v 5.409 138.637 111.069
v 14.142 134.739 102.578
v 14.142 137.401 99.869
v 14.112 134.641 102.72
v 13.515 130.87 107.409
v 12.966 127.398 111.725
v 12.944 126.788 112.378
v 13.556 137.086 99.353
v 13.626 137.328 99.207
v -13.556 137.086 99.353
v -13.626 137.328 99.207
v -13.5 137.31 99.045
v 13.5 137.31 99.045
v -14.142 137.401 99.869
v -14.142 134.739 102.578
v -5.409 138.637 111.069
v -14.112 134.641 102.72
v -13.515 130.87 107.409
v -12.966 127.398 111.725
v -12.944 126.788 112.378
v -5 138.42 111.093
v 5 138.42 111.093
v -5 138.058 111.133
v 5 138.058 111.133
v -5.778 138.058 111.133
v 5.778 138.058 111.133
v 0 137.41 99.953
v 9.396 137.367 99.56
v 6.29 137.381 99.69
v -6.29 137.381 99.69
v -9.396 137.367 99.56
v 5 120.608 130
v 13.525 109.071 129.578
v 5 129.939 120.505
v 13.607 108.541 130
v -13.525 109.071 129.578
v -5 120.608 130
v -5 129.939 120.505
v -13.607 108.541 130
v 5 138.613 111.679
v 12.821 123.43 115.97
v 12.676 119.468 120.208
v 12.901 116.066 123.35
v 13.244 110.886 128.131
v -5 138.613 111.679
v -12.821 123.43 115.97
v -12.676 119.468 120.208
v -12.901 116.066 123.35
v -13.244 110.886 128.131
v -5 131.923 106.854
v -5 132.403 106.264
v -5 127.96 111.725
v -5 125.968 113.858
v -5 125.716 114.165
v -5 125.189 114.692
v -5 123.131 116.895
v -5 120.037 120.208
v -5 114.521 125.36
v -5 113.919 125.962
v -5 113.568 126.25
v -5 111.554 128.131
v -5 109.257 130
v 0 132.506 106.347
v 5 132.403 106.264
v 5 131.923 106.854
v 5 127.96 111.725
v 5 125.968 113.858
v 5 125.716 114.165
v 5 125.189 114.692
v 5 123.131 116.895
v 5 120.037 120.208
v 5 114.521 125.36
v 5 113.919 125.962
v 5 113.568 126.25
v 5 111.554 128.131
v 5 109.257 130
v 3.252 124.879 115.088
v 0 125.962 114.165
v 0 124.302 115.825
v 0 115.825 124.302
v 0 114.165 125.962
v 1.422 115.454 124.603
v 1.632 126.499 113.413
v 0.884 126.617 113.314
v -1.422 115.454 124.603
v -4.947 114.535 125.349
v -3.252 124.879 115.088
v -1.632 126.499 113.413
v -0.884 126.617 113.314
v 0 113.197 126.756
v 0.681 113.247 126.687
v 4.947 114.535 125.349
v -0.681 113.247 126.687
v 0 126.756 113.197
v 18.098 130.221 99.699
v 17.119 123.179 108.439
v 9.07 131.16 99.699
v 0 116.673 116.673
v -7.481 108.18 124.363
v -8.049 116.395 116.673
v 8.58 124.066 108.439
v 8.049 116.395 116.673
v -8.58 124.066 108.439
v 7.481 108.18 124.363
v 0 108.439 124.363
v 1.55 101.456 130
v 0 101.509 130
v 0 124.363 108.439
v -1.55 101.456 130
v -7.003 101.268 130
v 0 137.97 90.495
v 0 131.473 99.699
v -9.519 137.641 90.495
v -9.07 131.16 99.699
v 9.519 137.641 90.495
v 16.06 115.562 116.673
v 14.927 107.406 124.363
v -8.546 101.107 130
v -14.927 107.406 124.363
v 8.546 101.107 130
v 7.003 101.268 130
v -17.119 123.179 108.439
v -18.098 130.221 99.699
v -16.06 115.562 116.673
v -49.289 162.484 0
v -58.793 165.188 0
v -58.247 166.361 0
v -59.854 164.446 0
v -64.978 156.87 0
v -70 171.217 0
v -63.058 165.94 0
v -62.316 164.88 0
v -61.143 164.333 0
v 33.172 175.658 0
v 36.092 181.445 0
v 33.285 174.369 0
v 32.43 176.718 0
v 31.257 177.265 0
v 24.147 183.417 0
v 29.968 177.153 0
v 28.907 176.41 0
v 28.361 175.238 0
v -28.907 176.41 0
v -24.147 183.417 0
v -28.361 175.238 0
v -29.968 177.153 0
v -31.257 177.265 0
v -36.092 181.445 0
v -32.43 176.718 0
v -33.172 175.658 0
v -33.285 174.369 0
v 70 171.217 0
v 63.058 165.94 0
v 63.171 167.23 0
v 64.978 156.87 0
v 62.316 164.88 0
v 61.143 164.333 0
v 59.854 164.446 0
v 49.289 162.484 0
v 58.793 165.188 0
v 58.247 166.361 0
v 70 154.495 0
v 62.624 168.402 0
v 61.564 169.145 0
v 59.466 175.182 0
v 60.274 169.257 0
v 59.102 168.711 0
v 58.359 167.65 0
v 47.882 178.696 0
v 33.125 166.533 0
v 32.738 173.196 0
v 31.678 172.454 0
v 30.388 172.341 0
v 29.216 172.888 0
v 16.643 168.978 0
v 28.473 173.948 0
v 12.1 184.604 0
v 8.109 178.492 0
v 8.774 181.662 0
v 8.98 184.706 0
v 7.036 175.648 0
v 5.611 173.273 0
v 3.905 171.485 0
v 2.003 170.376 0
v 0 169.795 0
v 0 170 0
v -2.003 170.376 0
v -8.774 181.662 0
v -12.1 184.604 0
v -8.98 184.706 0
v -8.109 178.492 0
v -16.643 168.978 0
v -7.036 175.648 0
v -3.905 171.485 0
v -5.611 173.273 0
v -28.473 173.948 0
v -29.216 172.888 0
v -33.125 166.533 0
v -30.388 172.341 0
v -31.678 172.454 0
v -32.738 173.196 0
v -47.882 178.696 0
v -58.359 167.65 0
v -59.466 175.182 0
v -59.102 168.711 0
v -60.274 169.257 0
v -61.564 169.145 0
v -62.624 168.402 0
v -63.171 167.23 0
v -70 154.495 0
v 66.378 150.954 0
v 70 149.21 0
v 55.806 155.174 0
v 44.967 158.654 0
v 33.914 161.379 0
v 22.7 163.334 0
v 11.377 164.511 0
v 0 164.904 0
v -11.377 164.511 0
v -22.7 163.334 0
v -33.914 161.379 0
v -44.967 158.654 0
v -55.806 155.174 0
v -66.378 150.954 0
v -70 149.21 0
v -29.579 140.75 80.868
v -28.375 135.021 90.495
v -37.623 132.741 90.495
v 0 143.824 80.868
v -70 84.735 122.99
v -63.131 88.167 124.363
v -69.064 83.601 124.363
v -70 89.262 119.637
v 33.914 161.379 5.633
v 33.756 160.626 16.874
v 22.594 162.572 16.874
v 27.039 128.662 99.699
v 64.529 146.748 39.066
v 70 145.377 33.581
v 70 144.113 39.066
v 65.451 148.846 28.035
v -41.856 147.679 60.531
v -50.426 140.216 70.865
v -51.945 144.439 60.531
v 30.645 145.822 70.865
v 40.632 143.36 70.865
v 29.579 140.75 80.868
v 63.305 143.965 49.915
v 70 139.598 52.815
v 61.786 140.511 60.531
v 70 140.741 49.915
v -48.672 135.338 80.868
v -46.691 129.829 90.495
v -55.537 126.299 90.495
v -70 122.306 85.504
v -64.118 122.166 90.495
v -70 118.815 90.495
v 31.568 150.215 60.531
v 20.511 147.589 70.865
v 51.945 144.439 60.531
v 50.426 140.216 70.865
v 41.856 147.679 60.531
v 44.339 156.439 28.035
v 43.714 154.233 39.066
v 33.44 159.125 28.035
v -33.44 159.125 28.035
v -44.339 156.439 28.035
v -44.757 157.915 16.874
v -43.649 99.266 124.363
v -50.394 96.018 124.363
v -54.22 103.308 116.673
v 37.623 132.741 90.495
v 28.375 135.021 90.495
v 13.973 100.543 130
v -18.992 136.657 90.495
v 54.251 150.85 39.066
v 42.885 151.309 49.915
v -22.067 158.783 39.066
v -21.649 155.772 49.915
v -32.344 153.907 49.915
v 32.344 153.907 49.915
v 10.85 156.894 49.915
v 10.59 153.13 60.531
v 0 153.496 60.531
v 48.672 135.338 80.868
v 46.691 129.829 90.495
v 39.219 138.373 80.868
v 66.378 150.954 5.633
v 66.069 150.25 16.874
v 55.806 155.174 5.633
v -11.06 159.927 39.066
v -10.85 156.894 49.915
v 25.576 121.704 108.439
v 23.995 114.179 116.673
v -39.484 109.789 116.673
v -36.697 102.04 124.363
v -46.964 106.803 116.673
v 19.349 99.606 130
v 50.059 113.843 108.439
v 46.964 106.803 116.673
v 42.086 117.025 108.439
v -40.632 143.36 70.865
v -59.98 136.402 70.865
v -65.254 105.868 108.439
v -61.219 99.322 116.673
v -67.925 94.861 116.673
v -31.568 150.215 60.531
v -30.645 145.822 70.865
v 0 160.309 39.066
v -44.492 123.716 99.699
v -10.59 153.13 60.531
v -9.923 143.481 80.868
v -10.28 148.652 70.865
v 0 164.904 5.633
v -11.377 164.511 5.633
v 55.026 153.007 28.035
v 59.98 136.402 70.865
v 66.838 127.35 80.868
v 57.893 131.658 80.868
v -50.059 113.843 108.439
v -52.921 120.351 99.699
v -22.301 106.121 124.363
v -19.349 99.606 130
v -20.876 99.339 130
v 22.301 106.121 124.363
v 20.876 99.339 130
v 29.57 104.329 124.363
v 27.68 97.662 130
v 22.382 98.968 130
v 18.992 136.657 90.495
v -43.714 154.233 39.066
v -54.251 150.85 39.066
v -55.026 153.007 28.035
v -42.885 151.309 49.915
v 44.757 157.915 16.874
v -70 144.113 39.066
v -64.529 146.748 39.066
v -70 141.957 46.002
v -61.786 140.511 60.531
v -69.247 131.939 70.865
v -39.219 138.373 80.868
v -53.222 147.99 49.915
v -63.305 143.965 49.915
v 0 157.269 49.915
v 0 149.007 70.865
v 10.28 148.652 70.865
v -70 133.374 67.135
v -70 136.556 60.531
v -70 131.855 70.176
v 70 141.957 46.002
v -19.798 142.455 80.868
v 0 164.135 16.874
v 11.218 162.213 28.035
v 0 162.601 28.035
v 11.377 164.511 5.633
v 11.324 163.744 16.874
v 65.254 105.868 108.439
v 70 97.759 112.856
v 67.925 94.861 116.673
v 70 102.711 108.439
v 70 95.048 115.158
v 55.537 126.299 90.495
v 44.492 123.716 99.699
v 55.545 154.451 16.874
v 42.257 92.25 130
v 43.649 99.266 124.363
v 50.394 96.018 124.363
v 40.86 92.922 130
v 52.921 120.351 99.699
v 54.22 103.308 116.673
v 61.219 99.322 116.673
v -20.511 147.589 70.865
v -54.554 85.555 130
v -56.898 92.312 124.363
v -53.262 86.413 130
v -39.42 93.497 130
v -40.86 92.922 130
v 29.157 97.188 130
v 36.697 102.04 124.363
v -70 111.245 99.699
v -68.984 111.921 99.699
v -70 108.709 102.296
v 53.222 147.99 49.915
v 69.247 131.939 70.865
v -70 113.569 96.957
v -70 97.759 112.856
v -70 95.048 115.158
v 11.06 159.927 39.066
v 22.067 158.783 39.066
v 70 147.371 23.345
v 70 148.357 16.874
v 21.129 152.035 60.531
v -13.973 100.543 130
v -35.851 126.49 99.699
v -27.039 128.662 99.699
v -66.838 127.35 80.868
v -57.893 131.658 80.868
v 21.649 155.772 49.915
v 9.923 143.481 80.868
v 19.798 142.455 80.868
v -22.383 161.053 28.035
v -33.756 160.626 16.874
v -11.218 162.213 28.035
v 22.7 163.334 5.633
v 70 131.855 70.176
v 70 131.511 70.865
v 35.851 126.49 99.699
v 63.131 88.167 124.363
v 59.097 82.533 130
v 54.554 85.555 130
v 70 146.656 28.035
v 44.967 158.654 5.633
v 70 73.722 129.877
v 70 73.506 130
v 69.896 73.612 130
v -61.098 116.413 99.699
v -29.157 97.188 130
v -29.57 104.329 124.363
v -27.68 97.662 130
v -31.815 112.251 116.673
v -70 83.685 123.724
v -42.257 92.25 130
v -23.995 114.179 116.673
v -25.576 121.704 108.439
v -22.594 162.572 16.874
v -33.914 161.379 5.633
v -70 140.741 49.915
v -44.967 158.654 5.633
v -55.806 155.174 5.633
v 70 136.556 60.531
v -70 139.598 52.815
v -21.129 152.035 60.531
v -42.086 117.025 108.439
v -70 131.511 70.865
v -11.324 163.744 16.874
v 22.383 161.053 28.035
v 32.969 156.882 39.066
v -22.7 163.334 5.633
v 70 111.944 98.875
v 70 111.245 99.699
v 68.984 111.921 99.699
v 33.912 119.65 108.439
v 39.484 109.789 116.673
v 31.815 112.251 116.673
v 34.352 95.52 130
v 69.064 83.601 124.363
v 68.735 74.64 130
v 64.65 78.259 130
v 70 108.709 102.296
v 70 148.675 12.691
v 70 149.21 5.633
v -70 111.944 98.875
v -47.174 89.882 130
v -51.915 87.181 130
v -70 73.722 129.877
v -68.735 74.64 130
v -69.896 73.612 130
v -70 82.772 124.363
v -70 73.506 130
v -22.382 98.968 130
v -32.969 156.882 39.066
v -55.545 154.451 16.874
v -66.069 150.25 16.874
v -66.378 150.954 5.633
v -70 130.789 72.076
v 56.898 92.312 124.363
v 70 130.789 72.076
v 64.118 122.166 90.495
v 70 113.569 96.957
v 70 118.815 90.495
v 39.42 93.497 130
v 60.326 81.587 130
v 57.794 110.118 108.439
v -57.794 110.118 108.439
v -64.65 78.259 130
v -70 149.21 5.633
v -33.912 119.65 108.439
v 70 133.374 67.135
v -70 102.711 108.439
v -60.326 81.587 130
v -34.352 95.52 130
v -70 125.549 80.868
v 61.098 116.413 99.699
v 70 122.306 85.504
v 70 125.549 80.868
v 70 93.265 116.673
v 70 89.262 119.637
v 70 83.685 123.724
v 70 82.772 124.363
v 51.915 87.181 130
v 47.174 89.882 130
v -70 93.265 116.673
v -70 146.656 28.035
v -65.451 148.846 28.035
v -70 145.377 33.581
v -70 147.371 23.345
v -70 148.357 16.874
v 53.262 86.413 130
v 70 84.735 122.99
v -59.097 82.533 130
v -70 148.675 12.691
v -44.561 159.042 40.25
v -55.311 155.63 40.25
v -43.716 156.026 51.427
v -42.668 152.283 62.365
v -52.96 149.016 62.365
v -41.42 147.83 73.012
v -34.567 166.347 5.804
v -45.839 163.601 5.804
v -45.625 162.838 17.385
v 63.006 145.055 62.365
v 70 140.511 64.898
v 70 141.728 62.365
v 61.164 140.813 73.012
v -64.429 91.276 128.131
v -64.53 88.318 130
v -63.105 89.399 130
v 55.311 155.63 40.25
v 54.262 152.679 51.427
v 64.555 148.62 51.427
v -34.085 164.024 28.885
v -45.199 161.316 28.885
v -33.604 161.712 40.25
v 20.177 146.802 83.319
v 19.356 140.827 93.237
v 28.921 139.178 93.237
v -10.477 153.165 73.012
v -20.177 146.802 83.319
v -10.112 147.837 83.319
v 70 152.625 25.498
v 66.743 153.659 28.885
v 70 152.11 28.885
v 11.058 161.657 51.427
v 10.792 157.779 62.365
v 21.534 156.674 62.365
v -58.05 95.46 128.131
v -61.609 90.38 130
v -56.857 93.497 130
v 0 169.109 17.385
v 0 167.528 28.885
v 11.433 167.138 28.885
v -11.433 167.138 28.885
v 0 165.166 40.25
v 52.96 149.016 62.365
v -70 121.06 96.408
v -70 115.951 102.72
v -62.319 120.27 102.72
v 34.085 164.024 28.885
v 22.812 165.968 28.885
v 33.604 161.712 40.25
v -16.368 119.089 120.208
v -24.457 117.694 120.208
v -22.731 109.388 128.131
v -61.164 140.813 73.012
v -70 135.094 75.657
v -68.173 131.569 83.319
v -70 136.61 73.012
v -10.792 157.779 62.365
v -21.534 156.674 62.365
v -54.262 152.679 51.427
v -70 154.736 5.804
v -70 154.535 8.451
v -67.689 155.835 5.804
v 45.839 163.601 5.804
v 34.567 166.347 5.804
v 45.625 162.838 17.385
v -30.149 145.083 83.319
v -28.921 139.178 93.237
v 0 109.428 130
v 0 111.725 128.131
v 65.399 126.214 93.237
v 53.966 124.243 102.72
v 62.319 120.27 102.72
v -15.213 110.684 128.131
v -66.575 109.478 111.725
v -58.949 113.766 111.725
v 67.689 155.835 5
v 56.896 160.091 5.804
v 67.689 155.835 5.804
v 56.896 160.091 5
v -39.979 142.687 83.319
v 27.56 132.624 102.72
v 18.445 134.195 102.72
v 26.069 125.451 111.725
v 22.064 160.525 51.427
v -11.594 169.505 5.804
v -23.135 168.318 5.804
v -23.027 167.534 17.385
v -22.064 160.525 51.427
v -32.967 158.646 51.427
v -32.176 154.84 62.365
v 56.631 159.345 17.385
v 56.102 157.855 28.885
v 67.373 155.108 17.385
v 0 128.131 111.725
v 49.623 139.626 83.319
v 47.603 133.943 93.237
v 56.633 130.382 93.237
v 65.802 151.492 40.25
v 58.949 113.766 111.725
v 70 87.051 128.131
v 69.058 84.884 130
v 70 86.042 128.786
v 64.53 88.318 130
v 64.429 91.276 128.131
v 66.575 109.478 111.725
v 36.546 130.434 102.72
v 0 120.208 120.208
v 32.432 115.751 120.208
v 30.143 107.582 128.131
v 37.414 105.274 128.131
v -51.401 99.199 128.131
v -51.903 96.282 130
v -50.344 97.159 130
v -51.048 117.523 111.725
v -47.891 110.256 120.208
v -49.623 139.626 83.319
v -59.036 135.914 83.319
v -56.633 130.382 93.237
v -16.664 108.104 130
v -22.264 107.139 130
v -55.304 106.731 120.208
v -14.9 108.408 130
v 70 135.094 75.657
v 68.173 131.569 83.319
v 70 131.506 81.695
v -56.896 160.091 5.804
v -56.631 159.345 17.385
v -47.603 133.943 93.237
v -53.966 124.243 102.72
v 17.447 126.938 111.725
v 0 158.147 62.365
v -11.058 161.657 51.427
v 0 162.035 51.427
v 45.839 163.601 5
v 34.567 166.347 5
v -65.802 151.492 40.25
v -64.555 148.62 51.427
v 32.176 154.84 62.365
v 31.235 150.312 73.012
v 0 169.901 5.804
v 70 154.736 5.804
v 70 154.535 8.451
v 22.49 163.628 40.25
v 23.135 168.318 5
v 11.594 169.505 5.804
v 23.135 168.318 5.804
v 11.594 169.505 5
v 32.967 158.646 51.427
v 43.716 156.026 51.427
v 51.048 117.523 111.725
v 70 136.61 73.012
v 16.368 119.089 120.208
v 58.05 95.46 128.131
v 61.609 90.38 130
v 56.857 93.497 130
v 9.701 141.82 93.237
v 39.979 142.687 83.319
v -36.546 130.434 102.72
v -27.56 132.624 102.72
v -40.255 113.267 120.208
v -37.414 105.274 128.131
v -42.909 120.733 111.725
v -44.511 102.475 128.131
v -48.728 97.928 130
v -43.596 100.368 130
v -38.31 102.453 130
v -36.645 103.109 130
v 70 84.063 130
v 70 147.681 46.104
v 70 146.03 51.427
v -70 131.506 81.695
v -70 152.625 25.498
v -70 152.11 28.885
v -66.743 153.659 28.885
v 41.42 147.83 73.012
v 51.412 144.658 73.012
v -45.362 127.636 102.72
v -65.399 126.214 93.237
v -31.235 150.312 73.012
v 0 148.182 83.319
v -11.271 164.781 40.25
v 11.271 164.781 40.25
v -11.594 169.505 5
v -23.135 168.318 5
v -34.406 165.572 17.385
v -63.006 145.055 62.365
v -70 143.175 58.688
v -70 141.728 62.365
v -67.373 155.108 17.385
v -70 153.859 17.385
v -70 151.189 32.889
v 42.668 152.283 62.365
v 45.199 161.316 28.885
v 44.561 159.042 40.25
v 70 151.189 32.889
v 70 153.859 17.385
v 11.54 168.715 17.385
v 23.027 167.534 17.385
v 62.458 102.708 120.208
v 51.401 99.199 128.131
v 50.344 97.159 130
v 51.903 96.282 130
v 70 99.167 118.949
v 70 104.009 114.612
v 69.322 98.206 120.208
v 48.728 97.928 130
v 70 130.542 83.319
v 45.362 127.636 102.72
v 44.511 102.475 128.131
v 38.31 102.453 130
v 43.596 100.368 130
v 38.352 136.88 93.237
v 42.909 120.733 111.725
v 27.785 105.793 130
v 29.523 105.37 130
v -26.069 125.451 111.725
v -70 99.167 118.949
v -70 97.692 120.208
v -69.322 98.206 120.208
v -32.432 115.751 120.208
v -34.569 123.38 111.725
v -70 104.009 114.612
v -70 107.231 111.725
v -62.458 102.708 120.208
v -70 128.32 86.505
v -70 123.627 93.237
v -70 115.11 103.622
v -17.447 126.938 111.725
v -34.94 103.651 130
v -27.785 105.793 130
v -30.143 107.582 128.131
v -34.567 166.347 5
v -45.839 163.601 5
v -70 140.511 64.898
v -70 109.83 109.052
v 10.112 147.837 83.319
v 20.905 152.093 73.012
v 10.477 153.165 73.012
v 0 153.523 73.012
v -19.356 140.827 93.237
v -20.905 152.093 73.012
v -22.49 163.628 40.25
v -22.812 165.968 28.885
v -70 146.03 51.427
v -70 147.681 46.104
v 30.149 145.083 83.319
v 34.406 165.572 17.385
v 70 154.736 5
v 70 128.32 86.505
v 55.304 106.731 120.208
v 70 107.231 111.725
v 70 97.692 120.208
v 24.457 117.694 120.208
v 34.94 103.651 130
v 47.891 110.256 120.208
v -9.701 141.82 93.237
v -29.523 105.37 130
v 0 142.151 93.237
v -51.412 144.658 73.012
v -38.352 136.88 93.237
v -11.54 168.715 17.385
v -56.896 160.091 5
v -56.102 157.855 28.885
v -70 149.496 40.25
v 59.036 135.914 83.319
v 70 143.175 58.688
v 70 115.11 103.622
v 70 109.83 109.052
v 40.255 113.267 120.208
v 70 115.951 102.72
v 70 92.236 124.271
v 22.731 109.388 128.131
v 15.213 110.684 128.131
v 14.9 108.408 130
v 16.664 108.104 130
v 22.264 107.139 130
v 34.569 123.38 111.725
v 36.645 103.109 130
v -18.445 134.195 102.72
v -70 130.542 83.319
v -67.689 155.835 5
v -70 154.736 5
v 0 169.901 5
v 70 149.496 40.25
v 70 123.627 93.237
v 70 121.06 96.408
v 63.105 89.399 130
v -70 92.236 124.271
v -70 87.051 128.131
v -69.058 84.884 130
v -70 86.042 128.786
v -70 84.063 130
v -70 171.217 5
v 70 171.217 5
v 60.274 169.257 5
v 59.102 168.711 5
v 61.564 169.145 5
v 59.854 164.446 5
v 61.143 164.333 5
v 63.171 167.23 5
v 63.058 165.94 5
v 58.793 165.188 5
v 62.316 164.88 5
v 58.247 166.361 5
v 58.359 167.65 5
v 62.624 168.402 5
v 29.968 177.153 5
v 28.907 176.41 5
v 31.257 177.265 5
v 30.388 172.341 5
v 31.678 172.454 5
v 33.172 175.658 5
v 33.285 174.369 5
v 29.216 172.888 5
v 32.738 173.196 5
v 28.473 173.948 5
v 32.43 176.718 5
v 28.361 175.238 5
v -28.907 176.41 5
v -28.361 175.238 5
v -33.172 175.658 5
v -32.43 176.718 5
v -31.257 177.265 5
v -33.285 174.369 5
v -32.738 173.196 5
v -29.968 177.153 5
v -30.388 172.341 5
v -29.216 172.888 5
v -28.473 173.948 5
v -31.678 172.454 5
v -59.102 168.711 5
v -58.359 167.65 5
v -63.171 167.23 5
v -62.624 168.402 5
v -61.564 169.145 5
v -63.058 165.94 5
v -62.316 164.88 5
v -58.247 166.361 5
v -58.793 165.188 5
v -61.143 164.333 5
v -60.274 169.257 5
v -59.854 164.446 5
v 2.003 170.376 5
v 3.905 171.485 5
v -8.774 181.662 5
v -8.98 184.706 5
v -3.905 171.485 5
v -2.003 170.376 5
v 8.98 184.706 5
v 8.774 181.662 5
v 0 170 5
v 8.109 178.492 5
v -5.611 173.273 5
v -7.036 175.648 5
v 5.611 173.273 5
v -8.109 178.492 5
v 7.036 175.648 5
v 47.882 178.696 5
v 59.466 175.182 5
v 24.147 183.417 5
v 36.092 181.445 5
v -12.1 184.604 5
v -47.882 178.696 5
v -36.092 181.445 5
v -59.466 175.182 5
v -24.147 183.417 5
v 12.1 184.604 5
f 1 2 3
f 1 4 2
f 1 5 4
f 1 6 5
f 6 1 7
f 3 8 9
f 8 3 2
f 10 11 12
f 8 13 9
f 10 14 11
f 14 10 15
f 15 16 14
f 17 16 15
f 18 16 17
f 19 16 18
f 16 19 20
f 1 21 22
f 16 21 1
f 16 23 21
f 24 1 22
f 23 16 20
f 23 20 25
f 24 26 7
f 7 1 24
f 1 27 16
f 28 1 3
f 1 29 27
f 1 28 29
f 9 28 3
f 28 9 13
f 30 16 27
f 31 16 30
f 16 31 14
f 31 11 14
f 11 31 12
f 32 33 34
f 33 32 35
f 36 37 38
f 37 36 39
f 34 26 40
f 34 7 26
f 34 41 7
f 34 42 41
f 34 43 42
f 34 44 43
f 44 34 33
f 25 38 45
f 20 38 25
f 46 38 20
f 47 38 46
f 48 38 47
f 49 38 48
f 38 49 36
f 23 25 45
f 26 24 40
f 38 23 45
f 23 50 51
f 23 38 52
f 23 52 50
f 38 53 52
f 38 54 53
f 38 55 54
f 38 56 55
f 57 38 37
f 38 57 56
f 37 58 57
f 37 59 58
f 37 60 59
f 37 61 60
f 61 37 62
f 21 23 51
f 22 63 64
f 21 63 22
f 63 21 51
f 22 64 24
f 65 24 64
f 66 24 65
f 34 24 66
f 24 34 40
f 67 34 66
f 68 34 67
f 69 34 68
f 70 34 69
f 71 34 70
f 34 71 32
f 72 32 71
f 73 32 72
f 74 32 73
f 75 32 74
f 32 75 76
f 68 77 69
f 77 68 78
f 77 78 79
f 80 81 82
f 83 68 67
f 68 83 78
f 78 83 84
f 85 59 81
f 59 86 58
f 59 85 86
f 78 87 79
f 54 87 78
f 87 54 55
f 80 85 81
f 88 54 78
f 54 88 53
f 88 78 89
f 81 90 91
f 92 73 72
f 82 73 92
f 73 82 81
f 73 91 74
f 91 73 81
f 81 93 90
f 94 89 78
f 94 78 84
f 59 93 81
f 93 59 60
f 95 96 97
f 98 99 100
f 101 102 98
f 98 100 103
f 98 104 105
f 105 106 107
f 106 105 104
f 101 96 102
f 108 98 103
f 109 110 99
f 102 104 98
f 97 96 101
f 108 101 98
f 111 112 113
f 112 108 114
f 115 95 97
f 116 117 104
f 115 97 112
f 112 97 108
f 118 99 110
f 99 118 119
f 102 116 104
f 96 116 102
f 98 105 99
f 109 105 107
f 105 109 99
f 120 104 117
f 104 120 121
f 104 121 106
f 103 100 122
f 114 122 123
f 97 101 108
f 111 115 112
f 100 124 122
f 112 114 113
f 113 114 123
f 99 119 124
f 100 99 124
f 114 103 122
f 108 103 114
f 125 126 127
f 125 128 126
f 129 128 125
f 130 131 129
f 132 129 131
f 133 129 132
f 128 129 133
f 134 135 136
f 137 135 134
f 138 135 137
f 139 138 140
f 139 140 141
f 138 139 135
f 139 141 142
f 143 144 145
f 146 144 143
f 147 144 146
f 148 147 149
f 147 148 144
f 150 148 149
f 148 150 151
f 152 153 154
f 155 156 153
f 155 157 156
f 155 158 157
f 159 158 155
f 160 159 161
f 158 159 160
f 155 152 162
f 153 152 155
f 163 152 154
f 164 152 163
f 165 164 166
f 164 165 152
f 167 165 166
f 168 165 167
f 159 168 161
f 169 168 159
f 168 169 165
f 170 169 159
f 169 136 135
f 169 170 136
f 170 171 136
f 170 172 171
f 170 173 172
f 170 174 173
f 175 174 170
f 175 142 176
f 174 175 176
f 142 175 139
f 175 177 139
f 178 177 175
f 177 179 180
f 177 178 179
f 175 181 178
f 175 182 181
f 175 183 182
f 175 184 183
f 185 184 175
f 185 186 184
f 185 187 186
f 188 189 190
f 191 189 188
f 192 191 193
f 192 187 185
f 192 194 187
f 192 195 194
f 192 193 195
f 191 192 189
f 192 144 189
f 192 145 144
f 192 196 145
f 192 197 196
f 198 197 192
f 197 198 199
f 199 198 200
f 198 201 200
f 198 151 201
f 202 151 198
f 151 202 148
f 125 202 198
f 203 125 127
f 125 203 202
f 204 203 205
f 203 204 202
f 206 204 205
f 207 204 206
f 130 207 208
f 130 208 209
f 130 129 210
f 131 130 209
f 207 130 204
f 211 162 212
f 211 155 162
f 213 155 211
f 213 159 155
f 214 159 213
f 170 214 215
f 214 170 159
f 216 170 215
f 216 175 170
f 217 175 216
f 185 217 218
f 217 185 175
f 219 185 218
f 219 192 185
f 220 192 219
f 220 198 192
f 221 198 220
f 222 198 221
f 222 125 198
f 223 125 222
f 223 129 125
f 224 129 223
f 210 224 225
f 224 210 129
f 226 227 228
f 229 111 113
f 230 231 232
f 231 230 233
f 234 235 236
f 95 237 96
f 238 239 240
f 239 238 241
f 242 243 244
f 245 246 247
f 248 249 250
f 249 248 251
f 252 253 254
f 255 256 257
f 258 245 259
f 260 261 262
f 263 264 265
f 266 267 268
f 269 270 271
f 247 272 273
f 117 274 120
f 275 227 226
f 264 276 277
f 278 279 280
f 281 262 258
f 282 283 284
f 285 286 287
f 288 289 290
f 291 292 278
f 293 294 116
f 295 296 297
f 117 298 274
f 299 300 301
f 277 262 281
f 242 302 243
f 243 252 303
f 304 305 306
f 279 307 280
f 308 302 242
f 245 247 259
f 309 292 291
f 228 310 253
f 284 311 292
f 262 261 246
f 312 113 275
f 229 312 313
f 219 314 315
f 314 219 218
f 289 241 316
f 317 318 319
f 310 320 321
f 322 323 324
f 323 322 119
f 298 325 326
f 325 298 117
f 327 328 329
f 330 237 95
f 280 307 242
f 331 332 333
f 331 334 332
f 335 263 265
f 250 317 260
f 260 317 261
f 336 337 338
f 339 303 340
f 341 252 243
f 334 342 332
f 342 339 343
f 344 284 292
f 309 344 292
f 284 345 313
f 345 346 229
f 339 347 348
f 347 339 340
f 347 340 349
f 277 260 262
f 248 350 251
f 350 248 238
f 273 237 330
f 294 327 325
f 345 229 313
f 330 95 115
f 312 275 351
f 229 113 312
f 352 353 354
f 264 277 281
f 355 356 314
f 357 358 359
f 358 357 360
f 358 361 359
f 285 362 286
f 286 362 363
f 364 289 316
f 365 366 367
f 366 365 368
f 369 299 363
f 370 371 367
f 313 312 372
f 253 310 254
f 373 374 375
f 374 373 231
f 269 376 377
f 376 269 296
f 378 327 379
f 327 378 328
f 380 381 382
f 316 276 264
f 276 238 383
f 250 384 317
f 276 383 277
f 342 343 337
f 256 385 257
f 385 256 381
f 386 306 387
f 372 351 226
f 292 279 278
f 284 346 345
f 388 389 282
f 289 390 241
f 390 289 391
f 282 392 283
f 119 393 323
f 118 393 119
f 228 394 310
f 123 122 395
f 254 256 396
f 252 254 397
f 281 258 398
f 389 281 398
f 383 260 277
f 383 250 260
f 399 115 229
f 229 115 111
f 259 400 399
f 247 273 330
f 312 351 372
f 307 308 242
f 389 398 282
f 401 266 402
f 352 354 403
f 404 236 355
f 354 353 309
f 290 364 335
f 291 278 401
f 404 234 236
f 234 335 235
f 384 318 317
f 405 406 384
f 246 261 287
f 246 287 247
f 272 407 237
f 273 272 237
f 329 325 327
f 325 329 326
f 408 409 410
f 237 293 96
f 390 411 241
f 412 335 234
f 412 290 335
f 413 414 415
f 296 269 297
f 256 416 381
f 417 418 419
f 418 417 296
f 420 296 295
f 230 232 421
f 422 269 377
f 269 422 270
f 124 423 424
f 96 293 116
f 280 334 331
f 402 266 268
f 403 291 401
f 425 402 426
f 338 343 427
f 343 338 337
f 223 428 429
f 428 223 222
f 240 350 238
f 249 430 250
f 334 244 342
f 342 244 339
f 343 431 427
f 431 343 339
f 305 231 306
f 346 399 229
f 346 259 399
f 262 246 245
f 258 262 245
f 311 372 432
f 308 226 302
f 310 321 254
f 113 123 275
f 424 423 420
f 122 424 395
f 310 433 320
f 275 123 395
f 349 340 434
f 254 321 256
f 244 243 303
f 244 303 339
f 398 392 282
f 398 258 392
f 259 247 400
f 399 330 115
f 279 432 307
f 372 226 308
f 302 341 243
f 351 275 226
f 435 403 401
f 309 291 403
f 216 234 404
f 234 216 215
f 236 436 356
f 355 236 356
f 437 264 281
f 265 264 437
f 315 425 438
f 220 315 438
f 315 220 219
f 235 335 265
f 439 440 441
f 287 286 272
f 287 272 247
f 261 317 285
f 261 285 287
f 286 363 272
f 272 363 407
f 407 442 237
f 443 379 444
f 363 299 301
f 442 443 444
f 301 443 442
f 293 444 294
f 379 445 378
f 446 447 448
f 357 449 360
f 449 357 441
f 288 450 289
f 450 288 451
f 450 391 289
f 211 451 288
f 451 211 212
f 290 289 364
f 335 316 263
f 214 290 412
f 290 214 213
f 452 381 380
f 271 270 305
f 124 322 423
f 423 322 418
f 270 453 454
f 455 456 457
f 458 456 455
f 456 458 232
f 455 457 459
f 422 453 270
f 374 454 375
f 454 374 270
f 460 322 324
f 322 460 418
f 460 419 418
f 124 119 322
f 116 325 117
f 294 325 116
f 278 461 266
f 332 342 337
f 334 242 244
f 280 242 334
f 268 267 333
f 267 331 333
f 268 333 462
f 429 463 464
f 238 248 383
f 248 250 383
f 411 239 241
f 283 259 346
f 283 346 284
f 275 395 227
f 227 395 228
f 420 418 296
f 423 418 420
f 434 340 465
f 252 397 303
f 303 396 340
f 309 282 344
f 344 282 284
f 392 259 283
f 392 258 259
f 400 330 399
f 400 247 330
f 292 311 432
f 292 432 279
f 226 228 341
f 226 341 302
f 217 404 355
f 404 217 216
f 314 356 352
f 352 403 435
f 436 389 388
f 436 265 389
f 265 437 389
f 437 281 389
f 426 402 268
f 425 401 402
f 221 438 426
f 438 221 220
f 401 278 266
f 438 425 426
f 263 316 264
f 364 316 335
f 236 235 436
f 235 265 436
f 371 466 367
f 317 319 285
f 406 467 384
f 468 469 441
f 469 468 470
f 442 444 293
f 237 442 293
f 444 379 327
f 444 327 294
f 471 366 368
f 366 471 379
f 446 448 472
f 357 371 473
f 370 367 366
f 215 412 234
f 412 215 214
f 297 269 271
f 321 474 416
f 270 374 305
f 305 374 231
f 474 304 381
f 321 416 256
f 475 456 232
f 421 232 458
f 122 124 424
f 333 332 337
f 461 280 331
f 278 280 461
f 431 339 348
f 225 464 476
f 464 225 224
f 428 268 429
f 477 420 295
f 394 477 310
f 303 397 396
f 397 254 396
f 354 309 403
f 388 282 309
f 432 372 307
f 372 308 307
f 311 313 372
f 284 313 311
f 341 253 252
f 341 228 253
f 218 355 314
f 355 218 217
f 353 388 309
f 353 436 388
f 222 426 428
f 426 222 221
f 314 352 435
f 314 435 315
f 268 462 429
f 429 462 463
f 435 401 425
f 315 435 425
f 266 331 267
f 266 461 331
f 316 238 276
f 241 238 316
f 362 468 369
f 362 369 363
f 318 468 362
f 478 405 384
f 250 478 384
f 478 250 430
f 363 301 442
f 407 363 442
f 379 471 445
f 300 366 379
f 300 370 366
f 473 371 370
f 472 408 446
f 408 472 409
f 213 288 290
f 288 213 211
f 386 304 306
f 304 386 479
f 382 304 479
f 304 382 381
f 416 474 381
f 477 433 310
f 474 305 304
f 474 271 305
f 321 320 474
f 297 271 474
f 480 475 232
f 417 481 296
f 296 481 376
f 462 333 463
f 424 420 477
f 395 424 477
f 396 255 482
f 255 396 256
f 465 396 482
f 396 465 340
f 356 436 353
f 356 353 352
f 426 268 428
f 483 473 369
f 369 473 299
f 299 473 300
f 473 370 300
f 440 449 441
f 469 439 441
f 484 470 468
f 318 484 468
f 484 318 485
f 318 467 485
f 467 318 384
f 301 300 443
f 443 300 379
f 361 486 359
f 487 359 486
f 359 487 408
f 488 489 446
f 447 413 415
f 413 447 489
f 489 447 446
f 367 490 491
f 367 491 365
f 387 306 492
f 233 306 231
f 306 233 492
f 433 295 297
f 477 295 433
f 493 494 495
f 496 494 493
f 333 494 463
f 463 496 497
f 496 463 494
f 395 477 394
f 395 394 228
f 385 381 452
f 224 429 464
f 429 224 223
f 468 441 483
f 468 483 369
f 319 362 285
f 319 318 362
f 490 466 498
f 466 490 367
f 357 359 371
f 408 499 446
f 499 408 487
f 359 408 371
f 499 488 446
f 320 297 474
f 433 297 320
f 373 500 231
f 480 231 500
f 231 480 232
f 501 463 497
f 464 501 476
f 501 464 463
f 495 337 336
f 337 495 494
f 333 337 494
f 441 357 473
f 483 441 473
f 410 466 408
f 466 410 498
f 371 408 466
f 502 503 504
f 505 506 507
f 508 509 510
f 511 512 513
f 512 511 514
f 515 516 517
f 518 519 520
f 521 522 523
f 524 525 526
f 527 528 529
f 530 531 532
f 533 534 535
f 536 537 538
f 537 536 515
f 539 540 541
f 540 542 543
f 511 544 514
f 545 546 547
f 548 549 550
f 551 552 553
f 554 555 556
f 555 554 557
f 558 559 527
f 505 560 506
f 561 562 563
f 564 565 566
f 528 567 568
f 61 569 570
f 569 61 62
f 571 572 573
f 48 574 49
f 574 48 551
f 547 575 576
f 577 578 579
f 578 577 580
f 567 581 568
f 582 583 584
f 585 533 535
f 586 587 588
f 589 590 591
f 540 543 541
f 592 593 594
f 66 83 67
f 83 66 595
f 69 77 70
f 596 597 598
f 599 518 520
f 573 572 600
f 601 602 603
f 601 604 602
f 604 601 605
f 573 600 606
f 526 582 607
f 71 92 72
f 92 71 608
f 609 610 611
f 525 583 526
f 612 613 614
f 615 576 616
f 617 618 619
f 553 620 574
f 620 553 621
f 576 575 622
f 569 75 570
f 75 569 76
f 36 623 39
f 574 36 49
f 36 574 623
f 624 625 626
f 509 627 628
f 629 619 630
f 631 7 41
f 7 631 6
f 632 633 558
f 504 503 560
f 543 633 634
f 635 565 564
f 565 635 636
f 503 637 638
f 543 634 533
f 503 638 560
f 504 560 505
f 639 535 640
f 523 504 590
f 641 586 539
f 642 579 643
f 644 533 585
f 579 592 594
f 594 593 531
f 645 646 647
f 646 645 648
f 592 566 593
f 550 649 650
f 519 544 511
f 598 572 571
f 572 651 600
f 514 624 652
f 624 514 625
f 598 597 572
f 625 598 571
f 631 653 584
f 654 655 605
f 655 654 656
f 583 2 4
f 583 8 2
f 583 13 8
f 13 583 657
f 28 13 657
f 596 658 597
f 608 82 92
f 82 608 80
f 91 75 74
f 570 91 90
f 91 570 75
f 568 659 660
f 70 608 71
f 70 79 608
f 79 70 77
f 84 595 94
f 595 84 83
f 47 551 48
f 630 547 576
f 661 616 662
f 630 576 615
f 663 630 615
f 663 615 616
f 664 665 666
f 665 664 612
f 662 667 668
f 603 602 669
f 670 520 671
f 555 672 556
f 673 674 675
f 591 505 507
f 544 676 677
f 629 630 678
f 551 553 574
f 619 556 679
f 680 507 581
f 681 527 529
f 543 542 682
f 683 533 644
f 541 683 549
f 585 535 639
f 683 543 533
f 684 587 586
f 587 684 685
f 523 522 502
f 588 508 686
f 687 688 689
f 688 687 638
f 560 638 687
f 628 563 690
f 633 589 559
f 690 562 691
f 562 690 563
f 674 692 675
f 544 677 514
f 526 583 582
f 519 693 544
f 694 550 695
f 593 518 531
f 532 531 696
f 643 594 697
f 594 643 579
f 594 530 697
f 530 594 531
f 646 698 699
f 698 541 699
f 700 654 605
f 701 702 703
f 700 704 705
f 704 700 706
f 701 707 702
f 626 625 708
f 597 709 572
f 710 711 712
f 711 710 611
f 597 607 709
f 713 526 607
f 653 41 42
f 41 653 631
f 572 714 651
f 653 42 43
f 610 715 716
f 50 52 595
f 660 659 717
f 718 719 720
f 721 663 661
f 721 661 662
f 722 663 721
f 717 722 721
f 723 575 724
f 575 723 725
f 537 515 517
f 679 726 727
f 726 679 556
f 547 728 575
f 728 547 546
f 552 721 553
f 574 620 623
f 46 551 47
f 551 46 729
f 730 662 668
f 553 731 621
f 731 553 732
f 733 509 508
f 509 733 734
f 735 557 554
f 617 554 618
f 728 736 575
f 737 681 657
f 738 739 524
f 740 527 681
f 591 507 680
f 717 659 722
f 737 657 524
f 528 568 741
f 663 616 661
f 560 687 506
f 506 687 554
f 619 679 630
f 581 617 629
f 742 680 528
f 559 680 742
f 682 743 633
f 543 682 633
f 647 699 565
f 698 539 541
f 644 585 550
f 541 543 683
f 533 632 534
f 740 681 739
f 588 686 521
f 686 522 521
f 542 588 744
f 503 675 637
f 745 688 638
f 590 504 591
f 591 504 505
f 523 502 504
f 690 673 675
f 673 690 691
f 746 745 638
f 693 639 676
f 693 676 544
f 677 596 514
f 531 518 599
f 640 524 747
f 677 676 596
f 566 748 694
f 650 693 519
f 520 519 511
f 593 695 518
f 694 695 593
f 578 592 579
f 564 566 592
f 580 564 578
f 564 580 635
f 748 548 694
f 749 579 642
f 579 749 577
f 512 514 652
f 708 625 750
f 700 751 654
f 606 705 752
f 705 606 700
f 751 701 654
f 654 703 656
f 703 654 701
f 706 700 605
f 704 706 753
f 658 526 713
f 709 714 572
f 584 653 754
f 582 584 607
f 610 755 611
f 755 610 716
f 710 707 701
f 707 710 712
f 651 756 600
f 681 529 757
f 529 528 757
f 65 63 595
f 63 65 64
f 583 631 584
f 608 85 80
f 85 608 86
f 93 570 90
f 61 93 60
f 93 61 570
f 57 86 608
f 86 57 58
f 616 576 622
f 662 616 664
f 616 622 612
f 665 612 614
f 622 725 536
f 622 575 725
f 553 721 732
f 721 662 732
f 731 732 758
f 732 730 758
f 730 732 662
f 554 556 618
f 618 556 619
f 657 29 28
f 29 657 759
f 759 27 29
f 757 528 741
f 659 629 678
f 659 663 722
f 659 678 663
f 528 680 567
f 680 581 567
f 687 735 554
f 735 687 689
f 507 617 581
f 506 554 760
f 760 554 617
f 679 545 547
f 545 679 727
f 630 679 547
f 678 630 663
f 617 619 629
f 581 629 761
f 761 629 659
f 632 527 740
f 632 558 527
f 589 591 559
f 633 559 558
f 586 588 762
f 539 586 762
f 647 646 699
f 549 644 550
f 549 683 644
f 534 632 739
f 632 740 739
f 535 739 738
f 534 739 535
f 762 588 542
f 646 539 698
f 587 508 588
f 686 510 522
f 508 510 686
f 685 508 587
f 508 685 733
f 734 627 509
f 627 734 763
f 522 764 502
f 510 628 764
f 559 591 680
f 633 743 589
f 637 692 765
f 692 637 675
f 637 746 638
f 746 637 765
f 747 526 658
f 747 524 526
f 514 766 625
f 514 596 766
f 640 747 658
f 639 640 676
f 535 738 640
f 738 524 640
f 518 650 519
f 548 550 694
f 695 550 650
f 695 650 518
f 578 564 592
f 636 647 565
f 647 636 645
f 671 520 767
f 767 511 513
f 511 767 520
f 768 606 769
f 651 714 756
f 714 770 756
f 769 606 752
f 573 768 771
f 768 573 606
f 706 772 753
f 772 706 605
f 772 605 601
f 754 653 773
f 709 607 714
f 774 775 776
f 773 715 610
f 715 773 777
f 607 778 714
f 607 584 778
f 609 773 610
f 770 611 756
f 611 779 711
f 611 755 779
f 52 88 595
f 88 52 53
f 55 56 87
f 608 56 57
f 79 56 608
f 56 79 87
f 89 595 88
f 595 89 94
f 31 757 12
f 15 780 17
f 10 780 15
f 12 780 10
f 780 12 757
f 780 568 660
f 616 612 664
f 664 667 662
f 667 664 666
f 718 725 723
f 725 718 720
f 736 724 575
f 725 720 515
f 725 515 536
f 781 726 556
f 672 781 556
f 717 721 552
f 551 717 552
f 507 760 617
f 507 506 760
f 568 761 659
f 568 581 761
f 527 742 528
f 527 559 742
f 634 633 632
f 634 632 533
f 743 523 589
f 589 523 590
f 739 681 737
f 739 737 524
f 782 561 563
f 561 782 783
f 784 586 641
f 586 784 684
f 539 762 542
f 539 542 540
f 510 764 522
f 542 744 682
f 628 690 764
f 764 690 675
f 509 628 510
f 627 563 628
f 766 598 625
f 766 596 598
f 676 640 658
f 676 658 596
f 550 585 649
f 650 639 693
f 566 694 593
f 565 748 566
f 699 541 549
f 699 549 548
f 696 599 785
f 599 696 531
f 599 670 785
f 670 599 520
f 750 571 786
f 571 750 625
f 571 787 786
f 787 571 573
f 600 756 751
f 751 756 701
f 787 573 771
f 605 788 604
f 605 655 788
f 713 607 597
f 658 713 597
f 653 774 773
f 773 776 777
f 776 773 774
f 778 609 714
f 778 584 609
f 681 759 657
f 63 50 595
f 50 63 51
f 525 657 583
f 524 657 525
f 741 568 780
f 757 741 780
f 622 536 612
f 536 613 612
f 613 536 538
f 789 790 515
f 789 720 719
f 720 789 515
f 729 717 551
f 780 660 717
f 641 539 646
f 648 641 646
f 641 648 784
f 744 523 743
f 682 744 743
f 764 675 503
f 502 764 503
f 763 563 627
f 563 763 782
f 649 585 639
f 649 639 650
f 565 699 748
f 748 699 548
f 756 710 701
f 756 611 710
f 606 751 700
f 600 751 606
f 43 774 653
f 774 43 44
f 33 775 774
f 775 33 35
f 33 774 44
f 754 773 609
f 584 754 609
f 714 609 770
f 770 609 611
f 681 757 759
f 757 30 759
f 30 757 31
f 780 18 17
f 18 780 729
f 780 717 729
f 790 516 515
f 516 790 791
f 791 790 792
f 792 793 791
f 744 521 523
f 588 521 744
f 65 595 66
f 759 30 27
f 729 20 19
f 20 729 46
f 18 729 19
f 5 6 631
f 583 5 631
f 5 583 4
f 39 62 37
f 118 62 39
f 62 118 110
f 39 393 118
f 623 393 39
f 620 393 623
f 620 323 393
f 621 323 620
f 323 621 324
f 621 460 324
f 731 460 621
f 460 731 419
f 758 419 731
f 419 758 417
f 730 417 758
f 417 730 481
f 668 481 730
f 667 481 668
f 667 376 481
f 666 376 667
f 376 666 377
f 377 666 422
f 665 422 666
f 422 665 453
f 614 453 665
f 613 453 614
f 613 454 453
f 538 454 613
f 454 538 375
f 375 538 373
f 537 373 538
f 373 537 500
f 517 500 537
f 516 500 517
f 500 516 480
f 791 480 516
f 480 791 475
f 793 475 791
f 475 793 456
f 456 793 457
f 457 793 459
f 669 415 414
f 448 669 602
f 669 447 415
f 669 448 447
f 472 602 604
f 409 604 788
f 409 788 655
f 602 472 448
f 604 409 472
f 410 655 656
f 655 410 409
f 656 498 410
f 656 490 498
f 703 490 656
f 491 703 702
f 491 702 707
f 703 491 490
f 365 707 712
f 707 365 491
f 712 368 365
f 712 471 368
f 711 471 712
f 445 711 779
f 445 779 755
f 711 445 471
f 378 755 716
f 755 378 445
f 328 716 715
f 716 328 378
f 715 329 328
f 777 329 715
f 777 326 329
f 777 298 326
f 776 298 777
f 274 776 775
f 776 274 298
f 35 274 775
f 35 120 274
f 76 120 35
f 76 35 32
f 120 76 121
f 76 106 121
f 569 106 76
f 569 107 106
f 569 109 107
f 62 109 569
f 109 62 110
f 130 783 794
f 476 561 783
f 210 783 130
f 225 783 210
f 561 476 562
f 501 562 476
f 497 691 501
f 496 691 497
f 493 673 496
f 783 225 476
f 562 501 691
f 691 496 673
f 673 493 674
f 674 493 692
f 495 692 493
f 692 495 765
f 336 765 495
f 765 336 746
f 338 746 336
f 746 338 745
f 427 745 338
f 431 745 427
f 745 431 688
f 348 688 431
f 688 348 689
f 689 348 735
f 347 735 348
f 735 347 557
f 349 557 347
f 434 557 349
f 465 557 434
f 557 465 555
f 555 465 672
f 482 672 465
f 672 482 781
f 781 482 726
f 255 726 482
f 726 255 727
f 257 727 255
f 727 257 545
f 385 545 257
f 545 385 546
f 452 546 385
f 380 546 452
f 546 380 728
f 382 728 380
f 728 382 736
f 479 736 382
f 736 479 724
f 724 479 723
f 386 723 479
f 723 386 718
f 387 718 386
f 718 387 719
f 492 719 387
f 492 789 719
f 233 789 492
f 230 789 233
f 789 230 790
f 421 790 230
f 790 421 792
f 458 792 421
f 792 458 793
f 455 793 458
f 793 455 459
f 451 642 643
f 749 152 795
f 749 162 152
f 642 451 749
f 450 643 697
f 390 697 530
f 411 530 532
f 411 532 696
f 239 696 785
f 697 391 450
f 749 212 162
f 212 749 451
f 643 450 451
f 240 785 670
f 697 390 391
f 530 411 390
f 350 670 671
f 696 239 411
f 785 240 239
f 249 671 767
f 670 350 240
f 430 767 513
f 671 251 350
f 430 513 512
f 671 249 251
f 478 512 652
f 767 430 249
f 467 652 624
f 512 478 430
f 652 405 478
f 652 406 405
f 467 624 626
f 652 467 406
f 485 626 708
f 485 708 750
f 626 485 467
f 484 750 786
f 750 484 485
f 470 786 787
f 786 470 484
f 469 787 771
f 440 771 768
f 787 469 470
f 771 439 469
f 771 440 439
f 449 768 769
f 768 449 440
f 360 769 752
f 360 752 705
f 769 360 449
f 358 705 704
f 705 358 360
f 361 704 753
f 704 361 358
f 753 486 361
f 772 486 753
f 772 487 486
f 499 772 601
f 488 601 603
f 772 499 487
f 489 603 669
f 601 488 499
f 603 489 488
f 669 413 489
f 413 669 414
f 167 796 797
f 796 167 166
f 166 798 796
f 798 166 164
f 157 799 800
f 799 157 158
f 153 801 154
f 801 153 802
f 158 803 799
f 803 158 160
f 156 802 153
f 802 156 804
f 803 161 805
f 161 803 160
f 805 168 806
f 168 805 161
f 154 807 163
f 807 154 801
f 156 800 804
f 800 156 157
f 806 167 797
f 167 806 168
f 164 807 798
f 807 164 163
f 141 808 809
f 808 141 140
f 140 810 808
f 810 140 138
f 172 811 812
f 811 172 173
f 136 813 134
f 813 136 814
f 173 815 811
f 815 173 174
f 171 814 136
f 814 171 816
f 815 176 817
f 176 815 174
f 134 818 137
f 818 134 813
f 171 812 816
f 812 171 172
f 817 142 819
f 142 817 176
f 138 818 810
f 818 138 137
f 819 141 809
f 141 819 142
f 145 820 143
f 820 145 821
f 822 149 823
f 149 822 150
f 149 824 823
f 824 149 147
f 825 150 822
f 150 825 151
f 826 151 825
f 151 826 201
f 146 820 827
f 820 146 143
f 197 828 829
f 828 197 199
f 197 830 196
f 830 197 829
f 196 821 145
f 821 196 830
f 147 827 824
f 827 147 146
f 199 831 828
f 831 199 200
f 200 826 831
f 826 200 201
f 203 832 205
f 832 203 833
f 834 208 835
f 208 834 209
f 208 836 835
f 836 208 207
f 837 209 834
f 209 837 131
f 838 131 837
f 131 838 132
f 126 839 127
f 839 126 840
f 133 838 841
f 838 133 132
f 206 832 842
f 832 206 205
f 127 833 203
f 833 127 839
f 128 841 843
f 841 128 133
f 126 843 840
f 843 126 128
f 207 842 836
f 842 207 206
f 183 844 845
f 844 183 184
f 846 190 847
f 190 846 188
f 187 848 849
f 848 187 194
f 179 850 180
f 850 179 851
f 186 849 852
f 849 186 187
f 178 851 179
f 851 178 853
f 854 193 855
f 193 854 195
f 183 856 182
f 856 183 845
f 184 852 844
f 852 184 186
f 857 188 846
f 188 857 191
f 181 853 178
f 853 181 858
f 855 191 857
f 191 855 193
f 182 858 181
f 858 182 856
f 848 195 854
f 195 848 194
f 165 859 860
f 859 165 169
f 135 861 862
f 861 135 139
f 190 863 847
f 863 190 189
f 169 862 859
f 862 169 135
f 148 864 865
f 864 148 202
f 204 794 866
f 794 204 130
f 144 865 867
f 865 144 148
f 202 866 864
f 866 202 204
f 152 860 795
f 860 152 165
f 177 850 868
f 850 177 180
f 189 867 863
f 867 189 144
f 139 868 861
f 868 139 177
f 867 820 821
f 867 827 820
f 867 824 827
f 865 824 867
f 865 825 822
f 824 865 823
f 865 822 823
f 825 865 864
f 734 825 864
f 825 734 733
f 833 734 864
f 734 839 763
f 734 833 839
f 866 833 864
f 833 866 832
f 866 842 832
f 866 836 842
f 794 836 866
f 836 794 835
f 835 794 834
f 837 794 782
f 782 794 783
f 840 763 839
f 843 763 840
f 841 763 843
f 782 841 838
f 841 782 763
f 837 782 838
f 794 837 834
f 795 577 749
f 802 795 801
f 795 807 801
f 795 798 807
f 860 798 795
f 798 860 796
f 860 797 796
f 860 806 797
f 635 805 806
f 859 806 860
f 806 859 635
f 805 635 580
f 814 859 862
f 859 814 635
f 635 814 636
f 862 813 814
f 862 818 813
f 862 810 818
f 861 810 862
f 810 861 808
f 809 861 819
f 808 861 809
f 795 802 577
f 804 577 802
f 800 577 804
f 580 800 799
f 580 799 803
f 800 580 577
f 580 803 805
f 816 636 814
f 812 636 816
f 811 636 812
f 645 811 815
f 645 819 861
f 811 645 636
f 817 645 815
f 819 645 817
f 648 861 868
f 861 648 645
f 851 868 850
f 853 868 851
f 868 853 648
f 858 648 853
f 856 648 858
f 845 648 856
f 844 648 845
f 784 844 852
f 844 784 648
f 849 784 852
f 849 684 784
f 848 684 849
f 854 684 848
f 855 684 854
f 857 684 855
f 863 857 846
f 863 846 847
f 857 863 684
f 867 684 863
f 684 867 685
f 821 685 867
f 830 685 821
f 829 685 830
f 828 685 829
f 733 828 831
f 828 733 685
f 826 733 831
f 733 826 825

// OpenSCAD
// file: ../motors/MN5212.scad
use <../utils.scad>

module MN5212(){

	render(){
		translate([0,0, 42.5 / 2 - 23 / 2 - 4.9 - 6])
			cylinder(
				h = 23,
				r = 59 / 2,
				$fa = fa(59 / 2),
				center = true);
		translate([0,0, 42.5 / 2 - 4.9 / 2 - 6])
			cylinder(
				h = 4.9,
				r1 = 59 / 2,
				r2 = 24.8 / 2,
				$fa = fa(59 / 2),
				center = true);
		translate([0,0, - 42.5 / 2 + 5.6 / 2 + 3])
			cylinder(
				h = 5.6,
				r1 = 44 / 2,
				r2 = 59 / 2,
				$fa = fa(59 / 2),
				center = true);
		translate([0, 0, 42.5 / 2 - 3])
			cylinder(
				h = 6,
				r = 4 / 2,
				$fa = fa(4 / 2),
				center = true);
		translate([0, 0, - 42.5 / 2 + 1.5])
			cylinder(
				h = 3,
				r = 6 / 2,
				$fa = fa(6 / 2),
				center = true);
	}

}
// file: ../servos/HS_5065MG.scad
use <../utils.scad>

module HS_5065MG(){

	length = 23.75;
	width = 11.68;
	depth = 20.32;
	wing_width = 32.38;
	wing_thick = 3.43;
	shaft_offset = 6;
	hole_spacing = 28.32;
	shaft_height = 26.16;
	shaft_length = 2;

	module mounting_hole(){
		mh_rad = 2 / 2;
		translate(
			[
				hole_spacing / 2,
				0,
				depth / 2 - wing_thick / 2
			])
			cylinder(h = 5, r = mh_rad, $fa = fa(mh_rad), center = true);
	}

	difference(){
		union(){
			cube([length, width, depth], center = true);
			translate([0, 0, depth / 2 - wing_thick / 2])
				cube([wing_width, width, wing_thick], center = true);
			translate(
				[
					- length / 2 + shaft_offset,
					0,
					shaft_height - length / 2 + shaft_length / 2
				])
				cylinder(
					h = shaft_length,
					r = 1.5,
					$fa = fa(1.5),
					center = true);
		}	union(){

			mounting_hole();
			mirror() mounting_hole();
		}
	}
}

HS_5065MG();
// file: ../servos/LS_0006_servo.scad
// Author Michael Marques (DrYerzinia)

use <../utils.scad>

module ls_0006_servo(){
	
	length = 21.4;
	depth = 19.9;
	thickness = 11.65;

	gear_height = 2.6;
	gear_bump_height = 0.7;
	gear_bump_diameter = 1.97;
	gear_outer_bump_diameter = 6;
	gear_bump_offset = 12.2;

	shaft_height = 2.4;
	shaft_diameter = 3.74;
	shaft_offset = thickness / 2;
	shaft_screw_diameter = 1.3;
	
	wing_outer_width = 8.5;
	wing_top_off = 3.8;
	wing_length = 3.8;
	wing_thickness = 1.2;
	wing_hole_diameter = 1.85;
	wing_hole_edge_dist = 2;

	module wing_hole(){
		translate(
			[
				length / 2 + wing_hole_edge_dist,
				0,
				depth/2 - wing_top_off - wing_thickness / 2
			])
			cylinder(
				h = wing_thickness + 1,
				r = wing_hole_diameter / 2,
				$fn = 16,
				center = true);
	}

	module wing(){
		translate(
			[
				length / 2,
				thickness / 2,
				depth/2 - wing_top_off - wing_thickness
			])
			rotate([0,0,-90])
				trapezoid(
					thickness,
					wing_outer_width,
					wing_length,
					wing_thickness);
	}

	// Body
	cube([length, thickness, depth], center = true);

	difference(){
		union(){

			wing();
			mirror() wing();

			// Gear Bumps
			translate([0, 0, depth/2 + gear_height / 2]){
				translate([length / 2 - gear_bump_offset, 0, 0])
					cylinder(
						h = gear_height,
						r = gear_outer_bump_diameter / 2,
						$fn = 16,
						center = true);
				translate([length / 2 - gear_bump_offset, 0, gear_height/2 + gear_bump_height / 2])
					cylinder(
						h = gear_bump_height,
						r = gear_bump_diameter / 2,
						$fn = 16,
						center = true);
				translate([length / 2 - shaft_offset, 0, 0])
					cylinder(
						h = gear_height,
						r = thickness / 2,
						$fn = 32,
						center = true);
				// Shaft
				translate([length / 2 - shaft_offset, 0, gear_height])
					cylinder(
						h = shaft_height,
						r = shaft_diameter / 2,
						$fn = 16,
						center = true);
			}

		}
		union(){

			wing_hole();
			mirror() wing_hole();

			// Shaft_hole
			translate(
				[
					length / 2 - shaft_offset,
					0,
					depth/2 + gear_height * (3 / 2) + 0.5])
				cylinder(
					h = shaft_height + 1,
					r = shaft_screw_diameter / 2,
					$fn = 16,
					center = true);

		}
	}

}

module translate_ls_0006_attachment(){

	length = 21.4;
	thickness = 11.65;
	shaft_offset = thickness / 2;
	depth = 19.9;
	float = 3.3;

	translate([length / 2 - shaft_offset, 0, depth / 2 + float])
		children();

}

module bar_attachment(){

	height = 3.75;
	bar_length = 14.7;
	bar_thickness = 1.6;
	inner_radius = 5.9;
	outer_radius = 3.95;
	shaft_diameter = 3.7;
	upper_void_diameter = 4.8;
	screw_diameter = 2;
	hole_spacing = 2;
	hole_4_diameter = 1.2;
	hole_diameter = 1;
	hole_start_off = 4.7;
	top_void_depth = 0.67;
	bottom_void_depth = 1.84;

	translate([0, 0, height / 2]){
		difference(){
			union(){

				translate([0, inner_radius / 2, height / 2 - bar_thickness])
					rotate([0,0,-90])
						trapezoid(
							inner_radius,
							outer_radius,
							bar_length,
							bar_thickness);

				cylinder(
					h = height,
					r = inner_radius / 2,
					$fn = 16,
					center = true);

				translate([bar_length, 0, height / 2 - bar_thickness / 2])
					cylinder(
						h = bar_thickness,
						r = outer_radius / 2,
						$fn = 16,
						center = true);

			}
			union(){
				// screwhole
				cylinder(
					h = height + 1,
					r = screw_diameter / 2,
					$fn = 16,
					center = true);
				// voids
				translate([0, 0, height / 2 - top_void_depth / 2 + 0.5])
					cylinder(
						h = top_void_depth + 1,
						r = upper_void_diameter / 2,
						$fn = 16,
						center = true);
				translate([0, 0,  - bottom_void_depth / 2 - 0.5])
					cylinder(
						h = bottom_void_depth + 1,
						r = shaft_diameter / 2,
						$fn = 16,
						center = true);

				for(i = [0:4]){
					dia = (i != 3) ? hole_diameter : hole_4_diameter;
					translate(
						[
							hole_start_off + hole_spacing * i,
							0,
							height / 2 - bar_thickness / 2])
						cylinder(
							h = bar_thickness + 1,
							r = dia / 2,
							$fn = 16,
							center = true);
				}

			}
		}
	}

}

ls_0006_servo();
translate_ls_0006_attachment() bar_attachment();
// file: ../servos/parallax_continuous_rotation_servo.scad
// Author Michael Marques (DrYerzinia)

module parallax_continuous_rotation_servo(){

	depth = 37.7;
	length = 40.75;
	width = 19.75;

	mount_height = 2.7;
	mount_extent = 6.1;
	mount_from_top = 7.7;

	mount_hole_diameter = 4.46;
	mount_hole_spacing = 14.4 - mount_hole_diameter;

	shaft_diameter = 5.8;
	shaft_offset = 10;
	shaft_length = 3.5;

	module mounting_hole(){

			translate(
				[
					length / 2 + 5,
					mount_hole_spacing / 2,
					depth / 2 - mount_height / 2 - mount_from_top
				]
				)
				cylinder(
					h = mount_height + 1,
					r = mount_hole_diameter / 2,
					$fn=16,
					center = true);
	}

	difference(){
		union(){

			// Body
			cube([length,width,depth], center = true);

			// Mounting wings
			translate(
				[
					0,
					0,
					depth / 2 - mount_height / 2 - mount_from_top
				])
				cube(
					[
						length + mount_extent * 2,
						width,
						mount_height
					],
					center = true);

			// Shaft
			translate(
				[
					length / 2 - shaft_offset,
					0,
					depth / 2 + shaft_length / 2
				]
				)
				cylinder(
					h = shaft_length,
					r = shaft_diameter / 2,
					$fn = 16,
					center = true
				);

		}
		union(){

			// Mounting Holes
			mounting_hole();
			mirror()
				mounting_hole();

			translate([0,-mount_hole_spacing,0]){
				mounting_hole();
				mirror()
					mounting_hole();
			}
		}
	}

}

module translate_shaft(){

	depth = 37.7;
	length = 40.75;

	shaft_offset = 10;

	translate(
		[
			length / 2 - shaft_offset,
			0,
			depth / 2
		])
		children();
}

module round_servo_attachment(){

	height = 6;
	diameter = 20.8;
	inner_diameter = 8.6;
	plate_thickness = 2.45;

	float = 2;

	depth = 37.7;
	length = 40.75;

	shaft_offset = 10;

	plate_hole_spacing = 14.5;
	plate_hole_diameter = 1.4;
	plate_hole_minor_spacing = 3.5;

	screw_hole_diameter = 3;

	inner_diameter = 8;
	
	top_depth = 1.8;
	bottom_depth = 3.4;

	void_diameter = 5.8;

	module plate_hole(){
		cylinder(
			h = plate_thickness + 1,
			r = plate_hole_diameter / 2,
			$fn = 16,
			center = true
		);
	}

	module plate_hole_group(){
		translate([0, 0, height / 2 - plate_thickness / 2]){
			translate([0, plate_hole_spacing / 2, 0]){
					plate_hole();
					translate([- plate_hole_minor_spacing, 0, 0])
						plate_hole();
					translate([  plate_hole_minor_spacing, 0, 0])
						plate_hole();
			}
		}
	}

	translate(
		[
			length / 2 - shaft_offset,
			0,
			depth / 2 + height / 2 + float
		]
		)
		difference(){

			union(){

				// inner shaft
				cylinder(
					h = height,
					r = inner_diameter / 2,
					$fn = 16,
					center = true
				);

				// top
				translate([0, 0, height / 2 - plate_thickness / 2])
					cylinder(
						h = plate_thickness,
						r = diameter / 2,
						$fn = 32,
						center = true
					);
			}

			union(){

				// plate holes
				for(ang = [0:3]){
					rotate([0,0, ang * 90])
						plate_hole_group();
				}

				// screw hole
				cylinder(
					h = height + 1,
					r = screw_hole_diameter / 2,
					$fn = 16,
					center = true
				);

				// inner voids
				translate([0, 0, height / 2 - top_depth / 2 + 1])
					cylinder(
						h = top_depth + 1,
						r = void_diameter / 2,
						$fn = 16,
						center = true
					);
				translate([0, 0, -1])
					cylinder(
						h = bottom_depth + 1,
						r = void_diameter / 2,
						$fn = 16,
						center = true
					);

			}

		}

}

parallax_continuous_rotation_servo();
round_servo_attachment();
// file: ../hardware.scad
 // Author Michael Marques (DrYerzinia)

// http://www.ebay.com/itm/10-PCS-683-3x7x2-mm-Metal-OPEN-PRECISION-Miniature-Ball-Bearing-3-7-2-/291206307942?hash=item43cd3fa066:m:mCi6eovrGVk_CjIUjlhw8yg
// E-Bay empire.rc

module washer_M3_7x3_2x0_5mm(){

	difference(){
		cylinder(
			h = 0.5,
			r = 7 / 2,
			$fn = 16,
			center = true);
		cylinder(
			h = 0.5 + 0.1,
			r = 3.2 / 2,
			$fn = 16,
			center = true);
	}

}

module bearing_3x7x2mm(){

	difference(){
		cylinder(
			h = 2,
			r = 7 / 2,
			$fn = 16,
			center = true);
		cylinder(
			h = 2 + 1,
			r = 3 / 2,
			$fn = 16,
			center = true);
	}

}

module bearing_5x8x2_5mm(){

	difference(){
		cylinder(
			h = 2.5,
			r = 8 / 2,
			$fn = 16,
			center = true);
		cylinder(
			h = 2.5 + 1,
			r = 5 / 2,
			$fn = 16,
			center = true);
	}

}

module bearing_8x16x5mm(){

	difference(){
		cylinder(
			h = 5,
			r = 16 / 2,
			$fn = 16,
			center = true);
		cylinder(
			h = 5 + 1,
			r = 8 / 2,
			$fn = 16,
			center = true);
	}

}


bearing_5x8x2_5mm();
// file: ../utils.scad
// http://forum.openscad.org/Creating-pie-pizza-slice-shape-need-a-dynamic-length-array-td3148.html

module pie_slice(r, start_angle, end_angle) {
    R = r * sqrt(2) + 1;
    a0 = (4 * start_angle + 0 * end_angle) / 4;
    a1 = (3 * start_angle + 1 * end_angle) / 4;
    a2 = (2 * start_angle + 2 * end_angle) / 4;
    a3 = (1 * start_angle + 3 * end_angle) / 4;
    a4 = (0 * start_angle + 4 * end_angle) / 4;
    if(end_angle > start_angle)
        intersection() {
        circle(r, $fa = fa(r));
        polygon([
            [0,0],
            [R * cos(a0), R * sin(a0)],
            [R * cos(a1), R * sin(a1)],
            [R * cos(a2), R * sin(a2)],
            [R * cos(a3), R * sin(a3)],
            [R * cos(a4), R * sin(a4)],
            [0,0]
       ]);
    }
}

// https://github.com/openscad/openscad/issues/29

module rotate_about(v,a) {
	translate(v) rotate(a) translate(-v) children(0);
}

module rotate_about_axis(v, ang, axis) {
	translate(v) rotate(ang, axis) translate(-v) children(0);
}

// https://github.com/robofun/openscad-utils/blob/master/trapezoid.scad

module trapezoid(width_base, width_top,height,thickness) {
	

  linear_extrude(height = thickness) polygon(points=[[0,0],[width_base,0],[width_base-(width_base-width_top)/2,height],[(width_base-width_top)/2,height]], paths=[[0,1,2,3]]); 
  
}

// http://forum.openscad.org/fe-Tolerance-based-arc-approximation-td14212.html

function fa(r)=($fn>0)?360/$fn:($fe>0)?($fe<r)?min(45,2*acos(1-$fe/r)):45:$fa; 
// file: ../render_settings.scad
// Author Michael Marques (DrYerzinia)

// Lulzbot Mini tolerances
// x/y 0.1mm
// z   0.05mm
//
// 0.1mm   preview tolerance
// 0.025mm export  tolerance

$fs = 0.01;
$fn = undef;
$fa = 360 / 5;

$fe = 0.025;	// export
// main file
// Author Michael Marques (DrYerzinia)

include <../render_settings.scad>

use <../BB8.scad>

Body_P1();
